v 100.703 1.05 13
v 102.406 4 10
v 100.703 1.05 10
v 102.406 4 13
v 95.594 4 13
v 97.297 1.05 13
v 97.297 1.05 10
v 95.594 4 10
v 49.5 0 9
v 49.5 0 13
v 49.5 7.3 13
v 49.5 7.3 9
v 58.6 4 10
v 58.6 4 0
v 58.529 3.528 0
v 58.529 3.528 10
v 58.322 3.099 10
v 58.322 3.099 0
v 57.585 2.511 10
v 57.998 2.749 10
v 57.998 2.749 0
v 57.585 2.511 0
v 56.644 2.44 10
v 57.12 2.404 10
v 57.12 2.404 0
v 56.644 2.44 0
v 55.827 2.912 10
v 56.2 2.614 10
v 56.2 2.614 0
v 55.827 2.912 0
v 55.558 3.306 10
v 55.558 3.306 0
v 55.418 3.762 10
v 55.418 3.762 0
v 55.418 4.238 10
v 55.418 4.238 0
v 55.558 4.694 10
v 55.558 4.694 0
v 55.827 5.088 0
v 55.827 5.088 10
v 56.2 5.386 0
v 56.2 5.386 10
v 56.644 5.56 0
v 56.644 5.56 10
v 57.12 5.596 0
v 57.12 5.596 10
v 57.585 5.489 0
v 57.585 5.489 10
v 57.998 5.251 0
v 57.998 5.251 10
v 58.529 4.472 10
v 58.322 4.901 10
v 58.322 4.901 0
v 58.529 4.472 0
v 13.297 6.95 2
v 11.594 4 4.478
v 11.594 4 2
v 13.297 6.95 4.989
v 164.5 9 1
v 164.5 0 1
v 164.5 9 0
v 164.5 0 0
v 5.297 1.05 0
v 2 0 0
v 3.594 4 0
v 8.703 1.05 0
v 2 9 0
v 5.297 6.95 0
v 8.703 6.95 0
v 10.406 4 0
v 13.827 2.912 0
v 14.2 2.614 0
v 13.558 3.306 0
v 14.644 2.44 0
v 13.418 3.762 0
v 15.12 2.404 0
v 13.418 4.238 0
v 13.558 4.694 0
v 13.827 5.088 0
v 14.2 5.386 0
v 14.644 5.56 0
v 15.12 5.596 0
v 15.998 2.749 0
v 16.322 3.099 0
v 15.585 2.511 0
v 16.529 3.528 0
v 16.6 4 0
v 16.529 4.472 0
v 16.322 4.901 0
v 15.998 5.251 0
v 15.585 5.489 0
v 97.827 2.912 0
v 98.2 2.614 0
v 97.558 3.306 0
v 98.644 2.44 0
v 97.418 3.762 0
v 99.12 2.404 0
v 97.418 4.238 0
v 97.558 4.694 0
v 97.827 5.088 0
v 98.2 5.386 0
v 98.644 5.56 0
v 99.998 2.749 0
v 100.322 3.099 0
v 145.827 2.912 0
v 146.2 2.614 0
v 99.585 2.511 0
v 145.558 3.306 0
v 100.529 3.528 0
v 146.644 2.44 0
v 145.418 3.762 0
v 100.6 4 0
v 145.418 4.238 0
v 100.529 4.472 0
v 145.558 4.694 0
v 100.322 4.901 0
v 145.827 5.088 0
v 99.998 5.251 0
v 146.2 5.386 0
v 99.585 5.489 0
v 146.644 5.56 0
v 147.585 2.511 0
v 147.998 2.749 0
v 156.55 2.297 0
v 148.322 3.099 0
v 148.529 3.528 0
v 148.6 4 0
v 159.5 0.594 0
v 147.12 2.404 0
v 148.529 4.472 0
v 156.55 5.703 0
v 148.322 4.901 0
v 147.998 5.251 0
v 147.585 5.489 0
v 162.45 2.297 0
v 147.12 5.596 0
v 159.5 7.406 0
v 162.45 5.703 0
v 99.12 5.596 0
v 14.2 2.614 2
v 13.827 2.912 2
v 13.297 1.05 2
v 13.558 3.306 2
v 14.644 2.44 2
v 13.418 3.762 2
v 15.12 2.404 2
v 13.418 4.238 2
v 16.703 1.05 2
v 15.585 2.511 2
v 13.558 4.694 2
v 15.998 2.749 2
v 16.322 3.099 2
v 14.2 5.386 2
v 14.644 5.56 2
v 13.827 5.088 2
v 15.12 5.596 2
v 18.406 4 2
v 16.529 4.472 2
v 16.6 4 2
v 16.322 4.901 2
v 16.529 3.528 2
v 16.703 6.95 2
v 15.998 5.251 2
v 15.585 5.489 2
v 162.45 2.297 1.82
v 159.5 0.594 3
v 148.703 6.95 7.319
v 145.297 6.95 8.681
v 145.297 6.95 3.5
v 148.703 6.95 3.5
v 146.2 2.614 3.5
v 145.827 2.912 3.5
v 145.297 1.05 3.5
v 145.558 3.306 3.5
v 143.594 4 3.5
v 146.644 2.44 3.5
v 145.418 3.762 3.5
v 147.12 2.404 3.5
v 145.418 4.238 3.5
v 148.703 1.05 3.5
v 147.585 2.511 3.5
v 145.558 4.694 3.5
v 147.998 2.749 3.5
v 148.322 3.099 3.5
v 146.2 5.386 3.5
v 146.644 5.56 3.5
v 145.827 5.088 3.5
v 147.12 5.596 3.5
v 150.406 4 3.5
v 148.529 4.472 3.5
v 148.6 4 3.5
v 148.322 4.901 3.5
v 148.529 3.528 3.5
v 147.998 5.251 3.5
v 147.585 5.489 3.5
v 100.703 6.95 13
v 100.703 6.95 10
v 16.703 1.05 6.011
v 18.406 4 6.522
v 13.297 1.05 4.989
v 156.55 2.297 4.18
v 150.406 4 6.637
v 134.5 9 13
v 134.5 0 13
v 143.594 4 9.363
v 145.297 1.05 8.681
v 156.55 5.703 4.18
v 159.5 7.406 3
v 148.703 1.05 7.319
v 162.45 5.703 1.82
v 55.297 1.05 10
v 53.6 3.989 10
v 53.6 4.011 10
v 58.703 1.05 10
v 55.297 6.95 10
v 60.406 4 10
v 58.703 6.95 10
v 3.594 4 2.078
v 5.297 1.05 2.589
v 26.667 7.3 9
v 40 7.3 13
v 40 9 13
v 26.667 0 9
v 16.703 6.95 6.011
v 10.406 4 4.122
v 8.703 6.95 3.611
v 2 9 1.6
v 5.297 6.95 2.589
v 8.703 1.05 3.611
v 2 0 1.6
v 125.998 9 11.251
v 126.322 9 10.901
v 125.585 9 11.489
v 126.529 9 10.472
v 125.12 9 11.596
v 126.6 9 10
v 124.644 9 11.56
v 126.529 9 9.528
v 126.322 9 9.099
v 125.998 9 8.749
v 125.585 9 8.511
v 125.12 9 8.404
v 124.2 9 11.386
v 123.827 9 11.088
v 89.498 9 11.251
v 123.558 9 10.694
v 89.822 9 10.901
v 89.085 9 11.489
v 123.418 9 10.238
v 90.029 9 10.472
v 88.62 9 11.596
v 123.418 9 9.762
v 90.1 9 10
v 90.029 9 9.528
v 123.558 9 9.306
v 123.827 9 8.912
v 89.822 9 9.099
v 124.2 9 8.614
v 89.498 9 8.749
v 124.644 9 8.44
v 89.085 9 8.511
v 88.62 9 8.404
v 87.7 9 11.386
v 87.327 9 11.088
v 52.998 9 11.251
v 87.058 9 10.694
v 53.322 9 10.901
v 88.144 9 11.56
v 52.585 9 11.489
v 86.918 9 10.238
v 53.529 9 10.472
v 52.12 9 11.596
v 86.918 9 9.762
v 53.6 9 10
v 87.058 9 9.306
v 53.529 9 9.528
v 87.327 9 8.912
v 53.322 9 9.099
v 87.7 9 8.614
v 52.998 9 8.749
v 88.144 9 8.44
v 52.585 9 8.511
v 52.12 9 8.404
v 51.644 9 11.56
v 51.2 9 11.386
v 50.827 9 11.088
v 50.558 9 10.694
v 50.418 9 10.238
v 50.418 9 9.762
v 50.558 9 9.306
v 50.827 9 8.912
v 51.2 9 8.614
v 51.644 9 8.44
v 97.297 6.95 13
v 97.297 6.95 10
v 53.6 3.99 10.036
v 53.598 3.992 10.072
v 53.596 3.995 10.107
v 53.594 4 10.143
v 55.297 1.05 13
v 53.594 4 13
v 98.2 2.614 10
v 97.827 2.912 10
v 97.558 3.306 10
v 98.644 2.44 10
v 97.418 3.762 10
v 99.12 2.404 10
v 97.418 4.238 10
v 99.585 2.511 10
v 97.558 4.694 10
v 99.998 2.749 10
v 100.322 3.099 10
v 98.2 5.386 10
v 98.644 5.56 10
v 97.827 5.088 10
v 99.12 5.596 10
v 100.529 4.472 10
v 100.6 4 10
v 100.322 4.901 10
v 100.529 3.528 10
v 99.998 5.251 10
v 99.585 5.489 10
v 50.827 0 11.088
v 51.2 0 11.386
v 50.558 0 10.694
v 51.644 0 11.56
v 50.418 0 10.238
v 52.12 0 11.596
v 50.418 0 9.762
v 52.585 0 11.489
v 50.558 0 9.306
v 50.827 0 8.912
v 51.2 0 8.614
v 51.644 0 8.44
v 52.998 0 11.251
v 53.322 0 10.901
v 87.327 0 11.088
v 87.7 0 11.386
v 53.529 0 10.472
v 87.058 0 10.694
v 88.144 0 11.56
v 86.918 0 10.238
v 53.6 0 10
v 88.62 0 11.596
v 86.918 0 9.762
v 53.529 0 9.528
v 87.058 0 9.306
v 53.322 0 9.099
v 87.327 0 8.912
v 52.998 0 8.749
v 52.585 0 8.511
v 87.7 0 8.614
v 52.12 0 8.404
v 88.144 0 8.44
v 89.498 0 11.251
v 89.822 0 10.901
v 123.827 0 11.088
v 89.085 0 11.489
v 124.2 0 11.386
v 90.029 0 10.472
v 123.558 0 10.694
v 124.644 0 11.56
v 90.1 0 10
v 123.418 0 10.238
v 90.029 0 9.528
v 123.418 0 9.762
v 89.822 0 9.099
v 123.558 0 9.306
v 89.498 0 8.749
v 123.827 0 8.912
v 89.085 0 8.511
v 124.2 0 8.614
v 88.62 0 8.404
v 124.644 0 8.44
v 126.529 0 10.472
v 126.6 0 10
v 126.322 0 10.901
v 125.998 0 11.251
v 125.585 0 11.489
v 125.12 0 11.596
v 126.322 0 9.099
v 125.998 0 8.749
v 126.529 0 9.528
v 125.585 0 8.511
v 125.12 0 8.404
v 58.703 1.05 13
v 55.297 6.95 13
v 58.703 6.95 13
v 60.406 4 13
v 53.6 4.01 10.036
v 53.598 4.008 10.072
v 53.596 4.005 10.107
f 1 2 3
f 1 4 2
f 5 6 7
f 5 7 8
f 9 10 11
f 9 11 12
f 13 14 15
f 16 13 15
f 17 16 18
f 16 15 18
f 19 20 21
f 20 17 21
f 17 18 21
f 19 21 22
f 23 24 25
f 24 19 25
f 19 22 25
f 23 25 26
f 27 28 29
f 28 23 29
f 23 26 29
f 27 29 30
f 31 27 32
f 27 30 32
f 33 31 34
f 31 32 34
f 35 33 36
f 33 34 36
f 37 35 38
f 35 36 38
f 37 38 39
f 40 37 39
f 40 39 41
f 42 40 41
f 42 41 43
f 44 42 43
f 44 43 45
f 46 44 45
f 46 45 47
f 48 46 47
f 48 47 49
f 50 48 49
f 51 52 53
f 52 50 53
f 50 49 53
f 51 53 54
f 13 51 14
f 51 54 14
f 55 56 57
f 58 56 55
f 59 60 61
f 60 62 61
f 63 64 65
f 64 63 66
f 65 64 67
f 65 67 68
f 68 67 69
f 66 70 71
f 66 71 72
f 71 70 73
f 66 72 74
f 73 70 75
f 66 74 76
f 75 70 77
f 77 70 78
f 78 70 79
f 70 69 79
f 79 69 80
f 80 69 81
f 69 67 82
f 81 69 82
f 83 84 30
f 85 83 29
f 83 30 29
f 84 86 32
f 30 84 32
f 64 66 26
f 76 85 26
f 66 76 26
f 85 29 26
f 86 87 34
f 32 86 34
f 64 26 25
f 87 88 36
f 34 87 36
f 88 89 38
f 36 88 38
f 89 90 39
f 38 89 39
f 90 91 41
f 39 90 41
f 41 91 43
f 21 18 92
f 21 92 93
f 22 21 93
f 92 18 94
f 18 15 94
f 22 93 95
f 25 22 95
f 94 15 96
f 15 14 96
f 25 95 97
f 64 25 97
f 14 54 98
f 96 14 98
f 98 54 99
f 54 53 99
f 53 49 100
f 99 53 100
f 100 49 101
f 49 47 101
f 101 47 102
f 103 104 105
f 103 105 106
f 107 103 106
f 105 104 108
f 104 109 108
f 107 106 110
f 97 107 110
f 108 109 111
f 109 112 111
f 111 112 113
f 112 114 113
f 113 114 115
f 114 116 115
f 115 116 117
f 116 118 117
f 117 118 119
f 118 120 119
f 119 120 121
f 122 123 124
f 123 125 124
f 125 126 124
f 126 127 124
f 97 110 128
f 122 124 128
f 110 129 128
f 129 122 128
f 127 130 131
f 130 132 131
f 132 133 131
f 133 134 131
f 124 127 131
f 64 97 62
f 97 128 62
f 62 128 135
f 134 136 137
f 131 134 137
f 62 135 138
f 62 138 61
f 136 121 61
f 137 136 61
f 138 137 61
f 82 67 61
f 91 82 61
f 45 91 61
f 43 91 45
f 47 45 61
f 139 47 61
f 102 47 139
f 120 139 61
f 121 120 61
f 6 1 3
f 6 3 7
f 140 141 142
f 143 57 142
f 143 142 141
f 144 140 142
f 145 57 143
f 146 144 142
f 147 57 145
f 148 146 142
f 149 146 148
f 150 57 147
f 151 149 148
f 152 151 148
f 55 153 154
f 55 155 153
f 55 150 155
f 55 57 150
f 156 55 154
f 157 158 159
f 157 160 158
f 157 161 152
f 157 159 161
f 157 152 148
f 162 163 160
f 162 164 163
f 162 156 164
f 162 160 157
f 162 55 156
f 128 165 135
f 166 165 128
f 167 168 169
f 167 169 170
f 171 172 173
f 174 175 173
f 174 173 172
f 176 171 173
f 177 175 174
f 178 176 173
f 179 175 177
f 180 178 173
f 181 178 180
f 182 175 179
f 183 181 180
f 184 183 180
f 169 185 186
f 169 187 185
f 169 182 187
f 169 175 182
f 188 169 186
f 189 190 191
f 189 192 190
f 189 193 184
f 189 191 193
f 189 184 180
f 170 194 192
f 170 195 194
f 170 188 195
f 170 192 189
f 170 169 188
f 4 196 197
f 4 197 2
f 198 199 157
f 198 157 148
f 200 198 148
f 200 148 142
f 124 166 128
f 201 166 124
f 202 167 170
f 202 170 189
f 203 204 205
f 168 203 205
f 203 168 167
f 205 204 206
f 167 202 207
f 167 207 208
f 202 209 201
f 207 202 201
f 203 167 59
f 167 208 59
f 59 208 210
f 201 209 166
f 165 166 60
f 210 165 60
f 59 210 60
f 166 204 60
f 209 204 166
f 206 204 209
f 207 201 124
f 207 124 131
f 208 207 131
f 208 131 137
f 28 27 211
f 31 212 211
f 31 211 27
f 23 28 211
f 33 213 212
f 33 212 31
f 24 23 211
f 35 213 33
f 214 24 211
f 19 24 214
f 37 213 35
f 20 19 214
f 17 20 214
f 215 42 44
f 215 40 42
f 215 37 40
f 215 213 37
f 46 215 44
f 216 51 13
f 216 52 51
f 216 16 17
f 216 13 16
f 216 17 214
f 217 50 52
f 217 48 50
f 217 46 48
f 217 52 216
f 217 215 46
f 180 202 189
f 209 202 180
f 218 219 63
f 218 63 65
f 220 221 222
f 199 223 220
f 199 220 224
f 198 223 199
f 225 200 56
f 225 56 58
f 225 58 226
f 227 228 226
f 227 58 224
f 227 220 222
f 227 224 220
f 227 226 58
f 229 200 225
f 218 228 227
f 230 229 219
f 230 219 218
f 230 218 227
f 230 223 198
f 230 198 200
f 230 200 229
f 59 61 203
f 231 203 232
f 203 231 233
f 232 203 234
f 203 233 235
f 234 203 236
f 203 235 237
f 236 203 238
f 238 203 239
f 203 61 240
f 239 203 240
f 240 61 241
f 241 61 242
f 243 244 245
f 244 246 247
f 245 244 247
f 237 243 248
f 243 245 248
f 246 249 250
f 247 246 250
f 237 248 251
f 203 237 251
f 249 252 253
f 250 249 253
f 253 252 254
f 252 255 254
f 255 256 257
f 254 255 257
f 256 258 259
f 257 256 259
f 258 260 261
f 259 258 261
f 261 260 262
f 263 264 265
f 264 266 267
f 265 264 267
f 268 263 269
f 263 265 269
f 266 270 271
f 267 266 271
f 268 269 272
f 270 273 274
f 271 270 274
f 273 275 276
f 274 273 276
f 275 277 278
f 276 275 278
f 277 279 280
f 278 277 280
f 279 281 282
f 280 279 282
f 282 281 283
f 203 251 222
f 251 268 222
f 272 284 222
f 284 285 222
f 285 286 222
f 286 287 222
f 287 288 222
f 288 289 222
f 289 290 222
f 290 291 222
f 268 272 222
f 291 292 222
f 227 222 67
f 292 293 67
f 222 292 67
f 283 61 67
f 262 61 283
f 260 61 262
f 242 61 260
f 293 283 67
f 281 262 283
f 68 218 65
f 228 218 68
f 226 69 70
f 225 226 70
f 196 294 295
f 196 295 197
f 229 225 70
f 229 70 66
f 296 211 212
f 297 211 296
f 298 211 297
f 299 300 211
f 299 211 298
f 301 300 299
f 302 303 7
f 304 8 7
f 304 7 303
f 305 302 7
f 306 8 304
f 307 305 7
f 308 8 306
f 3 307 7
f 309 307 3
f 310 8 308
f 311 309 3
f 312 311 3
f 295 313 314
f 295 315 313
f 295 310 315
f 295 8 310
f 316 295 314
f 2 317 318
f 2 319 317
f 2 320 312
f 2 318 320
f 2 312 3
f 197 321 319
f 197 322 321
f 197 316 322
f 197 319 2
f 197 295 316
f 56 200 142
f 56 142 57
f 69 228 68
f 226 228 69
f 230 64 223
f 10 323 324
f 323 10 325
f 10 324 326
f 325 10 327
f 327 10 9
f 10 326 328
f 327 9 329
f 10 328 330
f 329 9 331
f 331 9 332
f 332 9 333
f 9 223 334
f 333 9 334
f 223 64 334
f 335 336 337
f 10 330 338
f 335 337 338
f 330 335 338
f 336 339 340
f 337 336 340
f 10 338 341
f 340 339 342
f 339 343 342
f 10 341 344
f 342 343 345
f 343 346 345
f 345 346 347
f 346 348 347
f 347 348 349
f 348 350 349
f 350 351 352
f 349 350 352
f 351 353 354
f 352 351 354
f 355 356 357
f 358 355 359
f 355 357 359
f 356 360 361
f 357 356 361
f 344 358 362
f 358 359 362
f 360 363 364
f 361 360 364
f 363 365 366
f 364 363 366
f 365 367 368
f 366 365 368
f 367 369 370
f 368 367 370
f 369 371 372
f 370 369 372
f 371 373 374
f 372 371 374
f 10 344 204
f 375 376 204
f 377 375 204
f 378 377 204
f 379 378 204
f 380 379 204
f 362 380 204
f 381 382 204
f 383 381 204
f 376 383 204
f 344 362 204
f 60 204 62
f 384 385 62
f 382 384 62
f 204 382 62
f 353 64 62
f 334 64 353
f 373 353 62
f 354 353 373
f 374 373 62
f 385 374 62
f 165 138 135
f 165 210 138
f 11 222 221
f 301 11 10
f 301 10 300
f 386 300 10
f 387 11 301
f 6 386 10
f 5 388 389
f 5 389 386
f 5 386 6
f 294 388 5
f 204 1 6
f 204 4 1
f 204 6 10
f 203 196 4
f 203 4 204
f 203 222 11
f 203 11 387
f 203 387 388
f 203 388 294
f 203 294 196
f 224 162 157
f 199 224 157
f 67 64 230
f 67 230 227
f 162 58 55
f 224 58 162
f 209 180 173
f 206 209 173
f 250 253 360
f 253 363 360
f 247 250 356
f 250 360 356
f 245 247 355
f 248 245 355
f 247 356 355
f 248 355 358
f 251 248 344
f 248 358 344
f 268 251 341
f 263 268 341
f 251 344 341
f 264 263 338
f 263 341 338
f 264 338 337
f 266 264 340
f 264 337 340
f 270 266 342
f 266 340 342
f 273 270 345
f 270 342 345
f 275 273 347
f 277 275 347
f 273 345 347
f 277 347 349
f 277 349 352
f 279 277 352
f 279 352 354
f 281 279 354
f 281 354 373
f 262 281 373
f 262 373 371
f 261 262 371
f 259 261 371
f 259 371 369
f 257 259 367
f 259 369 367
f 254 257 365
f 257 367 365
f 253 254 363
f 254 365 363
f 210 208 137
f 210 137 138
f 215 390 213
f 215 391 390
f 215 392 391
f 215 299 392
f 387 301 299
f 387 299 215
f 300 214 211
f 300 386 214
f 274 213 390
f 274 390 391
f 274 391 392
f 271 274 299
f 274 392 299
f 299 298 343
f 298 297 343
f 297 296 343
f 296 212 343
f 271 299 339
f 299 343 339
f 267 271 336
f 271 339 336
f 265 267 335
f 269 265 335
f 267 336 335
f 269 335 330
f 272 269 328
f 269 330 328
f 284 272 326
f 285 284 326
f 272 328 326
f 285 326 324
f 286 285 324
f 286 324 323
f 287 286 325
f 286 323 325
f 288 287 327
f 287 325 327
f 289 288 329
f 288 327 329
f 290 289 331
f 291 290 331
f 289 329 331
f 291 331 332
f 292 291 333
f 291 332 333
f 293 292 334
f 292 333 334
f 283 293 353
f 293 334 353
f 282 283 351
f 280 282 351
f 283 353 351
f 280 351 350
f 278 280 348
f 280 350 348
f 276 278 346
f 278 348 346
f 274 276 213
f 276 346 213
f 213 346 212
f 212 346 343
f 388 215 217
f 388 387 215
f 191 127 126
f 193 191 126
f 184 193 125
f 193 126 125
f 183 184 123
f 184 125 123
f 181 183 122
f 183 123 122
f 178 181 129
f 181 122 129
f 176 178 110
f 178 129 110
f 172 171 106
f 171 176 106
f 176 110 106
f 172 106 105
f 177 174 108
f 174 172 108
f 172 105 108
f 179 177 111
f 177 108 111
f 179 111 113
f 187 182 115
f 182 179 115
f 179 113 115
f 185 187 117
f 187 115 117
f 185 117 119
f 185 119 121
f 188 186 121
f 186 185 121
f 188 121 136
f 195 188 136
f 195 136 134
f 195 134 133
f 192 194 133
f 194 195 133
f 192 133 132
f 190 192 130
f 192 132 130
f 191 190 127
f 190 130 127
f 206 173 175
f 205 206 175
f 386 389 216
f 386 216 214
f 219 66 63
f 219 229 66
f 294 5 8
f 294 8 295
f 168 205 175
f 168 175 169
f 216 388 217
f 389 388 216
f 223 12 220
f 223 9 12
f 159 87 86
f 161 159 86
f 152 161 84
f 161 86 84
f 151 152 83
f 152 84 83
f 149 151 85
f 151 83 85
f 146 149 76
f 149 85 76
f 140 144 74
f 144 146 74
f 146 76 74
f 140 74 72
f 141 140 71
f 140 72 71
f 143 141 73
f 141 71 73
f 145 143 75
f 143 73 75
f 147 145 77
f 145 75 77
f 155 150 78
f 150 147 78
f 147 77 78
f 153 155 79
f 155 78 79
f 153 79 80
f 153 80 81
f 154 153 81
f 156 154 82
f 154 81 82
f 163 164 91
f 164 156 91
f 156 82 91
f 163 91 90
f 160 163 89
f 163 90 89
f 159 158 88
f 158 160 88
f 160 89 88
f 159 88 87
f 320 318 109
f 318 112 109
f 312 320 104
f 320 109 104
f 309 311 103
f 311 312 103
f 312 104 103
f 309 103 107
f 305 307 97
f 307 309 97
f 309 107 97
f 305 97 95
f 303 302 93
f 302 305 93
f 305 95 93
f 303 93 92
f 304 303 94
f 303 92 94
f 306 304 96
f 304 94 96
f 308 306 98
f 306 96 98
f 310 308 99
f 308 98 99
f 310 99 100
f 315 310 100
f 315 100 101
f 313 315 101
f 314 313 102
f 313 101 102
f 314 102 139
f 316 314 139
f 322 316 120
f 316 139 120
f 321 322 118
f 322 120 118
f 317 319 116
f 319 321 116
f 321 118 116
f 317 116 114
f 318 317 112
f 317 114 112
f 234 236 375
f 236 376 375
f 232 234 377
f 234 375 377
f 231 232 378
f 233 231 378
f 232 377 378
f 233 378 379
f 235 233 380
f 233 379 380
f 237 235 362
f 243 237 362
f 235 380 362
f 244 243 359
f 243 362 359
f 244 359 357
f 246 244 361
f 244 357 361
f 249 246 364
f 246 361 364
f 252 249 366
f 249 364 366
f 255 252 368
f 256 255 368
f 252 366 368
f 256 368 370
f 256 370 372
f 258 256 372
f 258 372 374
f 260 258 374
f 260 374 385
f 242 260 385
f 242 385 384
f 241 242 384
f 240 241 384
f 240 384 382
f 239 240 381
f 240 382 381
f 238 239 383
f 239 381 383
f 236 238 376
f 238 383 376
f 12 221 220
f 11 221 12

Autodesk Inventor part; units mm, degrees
ref_plane "YZ Plane" through (0, 0, 0) normal (1, 0, 0) x (0, 1, 0)
ref_plane "XZ Plane" through (0, 0, 0) normal (0, 1, 0) x (-1, 0, 0)
ref_plane "XY Plane" through (0, 0, 0) normal (0, 0, 1) x (1, 0, 0)
sketch "Sketch1" plane through (0, 0, 0) normal (0, 0, 1) x (1, 0, 0)
  line L0 (0, 0) -> (164.5, 0)
  line L1 (164.5, 0) -> (164.5, 9)
  line L2 (164.5, 9) -> (0, 9)
  line L3 (0, 9) -> (0, 0)
  circle A0 centre (57, 4) radius 1.6
  circle A1 centre (99, 4) radius 1.6
  circle A2 centre (159.5, 4) radius 1.6
  circle A3 centre (147, 4) radius 1.6
  circle A4 centre (15, 4) radius 1.6
  circle A5 centre (7, 4) radius 1.6
  dimension "d1" = 9
  dimension "d2" = 90
  dimension "d4" = 3.2
  dimension "d6" = 3.2
  dimension "d7" = 3.2
  dimension "d8" = 42
  dimension "d9" = 60.5
  dimension "d26" = 3.2
  dimension "d27" = 48
  dimension "d28" = 3.2
  dimension "d29" = 42
  dimension "d32" = 15
  dimension "d33" = 5
  dimension "d61" = 3.2
  dimension "d62" = 8
  dimension "d63" = 12.5
  dimension "d108" = 4
  dimension "d109" = 4
  dimension "d110" = 4
  dimension "d111" = 4
  dimension "d112" = 4
  dimension "d113" = 4
ref_plane "Work Plane2" through (0, 0, 0) normal (0, -1, 0) x (1, 0, 0)
sketch "Sketch2" plane through (0, 0, 0) normal (0, -1, 0) x (1, 0, 0)
  circle A0 centre (52, 10) radius 1.6
  circle A1 centre (125, 10) radius 1.6
  circle A2 centre (88.5, 10) radius 1.6
  point P0 (0, 0)
  point P1 (52, 0)
  dimension "d13" = 3.2
  dimension "d15" = 3.2
  dimension "d17" = 3.2
  dimension "d18" = 36.5
  dimension "d64" = 52
  dimension "d65" = 36.5
  dimension "d114" = 10
  dimension "d115" = 73
ref_plane "Work Plane1" through (0, 0, 11) normal (0, 0, 1) x (1, 0, 0)
extrude "klocek" add sketch "Sketch1" along normal blind 13
ref_plane "Work Plane3" through (0, 0, 0) normal (0, -1, 0) x (1, 0, 0)
extrude "prowadzenie osi" cut sketch "Sketch2" against normal up to next
ref_plane "Work Plane4" through (0, 0, 0) normal (0, -1, 0) x (1, 0, 0)
sketch "Sketch7" plane through (0, 0, 0) normal (0, -1, 0) x (1, 0, 0)
  line L0 (0, 13) -> (0, 1)
  line L1 (0, 13) -> (164.5, 13) projected
  line L2 (0, 13) -> (40, 13)
  line L3 (40, 13) -> (0, 1)
  point P0 (0, -1.8333)
  dimension "d86" = 12
  dimension "d87" = 40
sketch "Sketch8" plane through (0, 0, 0) normal (0, -1, 0) x (1, 0, 0)
  line L0 (164.5, 0) -> (164.5, 13) projected
  line L1 (164.5, 13) -> (164.5, 1)
  line L2 (164.5, 13) -> (0, 13) projected
  line L3 (164.5, 13) -> (134.5, 13)
  line L4 (134.5, 13) -> (164.5, 1)
  point P0 (0, 0)
  point P1 (40.8333, 11)
  dimension "d80" = 12
  dimension "d81" = 30
extrude "przedni skos" cut sketch "Sketch7" against normal up to next
extrude "tylni skos" cut sketch "Sketch8" against normal up to next
ref_plane "Work Plane7" through (0, 0, 11) normal (0, 0, 1) x (1, 0, 0)
sketch "Sketch5" plane through (0, 0, 13) normal (0, 0, 1) x (1, 0, 0)
  circle A0 centre (99, 4) radius 1.6 projected
  line L0 (95.5936, 4) -> (97.2968, 6.95)
  line L1 (97.2968, 6.95) -> (100.7032, 6.95)
  line L2 (100.7032, 6.95) -> (102.4064, 4)
  line L3 (102.4064, 4) -> (100.7032, 1.05)
  line L4 (100.7032, 1.05) -> (97.2968, 1.05)
  line L5 (97.2968, 1.05) -> (95.5936, 4)
  circle A1 centre (57, 4) radius 1.6 projected
  line L6 (60.4064, 4) -> (58.7032, 1.05)
  line L7 (58.7032, 1.05) -> (55.2968, 1.05)
  line L8 (55.2968, 1.05) -> (53.5936, 4)
  line L9 (53.5936, 4) -> (55.2968, 6.95)
  line L10 (55.2968, 6.95) -> (58.7032, 6.95)
  line L11 (58.7032, 6.95) -> (60.4064, 4)
  point P0 (119.5, 5)
  dimension "d98" = 5.9
  dimension "d100" = 5.9
extrude "hex insert middle" cut sketch "Sketch5" against normal blind 3
ref_plane "Work Plane6" through (0, 0, 11) normal (0, 0, 1) x (1, 0, 0)
sketch "Sketch9" plane through (0, 0, 11) normal (0, 0, 1) x (1, 0, 0)
  circle A0 centre (147, 4) radius 1.6 projected
  line L0 (150.4064, 4) -> (148.7032, 1.05)
  line L1 (148.7032, 1.05) -> (145.2968, 1.05)
  line L2 (145.2968, 1.05) -> (143.5936, 4)
  line L3 (143.5936, 4) -> (145.2968, 6.95)
  line L4 (145.2968, 6.95) -> (148.7032, 6.95)
  line L5 (148.7032, 6.95) -> (150.4064, 4)
  point P0 (0, 0)
  point P1 (153, 5)
  dimension "d99" = 5.9
extrude "hex insert rear 1" cut sketch "Sketch9" against normal blind 7.5
ref_plane "Work Plane5" through (0, 0, 11) normal (0, 0, 1) x (1, 0, 0)
sketch "Sketch10" plane through (0, 0, 11) normal (0, 0, 1) x (1, 0, 0)
  circle A0 centre (159.5, 4) radius 1.6 projected
  line L0 (162.45, 5.7032) -> (162.45, 2.2968)
  line L1 (162.45, 2.2968) -> (159.5, 0.5936)
  line L2 (159.5, 0.5936) -> (156.55, 2.2968)
  line L3 (156.55, 2.2968) -> (156.55, 5.7032)
  line L4 (156.55, 5.7032) -> (159.5, 7.4064)
  line L5 (159.5, 7.4064) -> (162.45, 5.7032)
  line L6 (164.5, 0) -> (134.5, 0) projected
  point P0 (0, 0)
  dimension "d118" = 5.9
extrude "hex insert rear 2" cut sketch "Sketch10" against normal up to next contours A0 | L0 L1 L2 L3 L4 L5
sketch "Sketch13" plane through (0, 0, 11) normal (0, 0, 1) x (1, 0, 0)
  circle A0 centre (7, 4) radius 1.6 projected
  line L0 (10.4064, 4) -> (8.7032, 1.05)
  line L1 (8.7032, 1.05) -> (5.2968, 1.05)
  line L2 (5.2968, 1.05) -> (3.5936, 4)
  line L3 (3.5936, 4) -> (5.2968, 6.95)
  line L4 (5.2968, 6.95) -> (8.7032, 6.95)
  line L5 (8.7032, 6.95) -> (10.4064, 4)
  dimension "d123" = 5.9
extrude "hex insert front 1" cut sketch "Sketch13" against normal through all
sketch "Sketch16" plane through (0, 0, 11) normal (0, 0, 1) x (1, 0, 0)
  circle A0 centre (15, 4) radius 1.6 projected
  line L0 (18.4064, 4) -> (16.7032, 1.05)
  line L1 (16.7032, 1.05) -> (13.2968, 1.05)
  line L2 (13.2968, 1.05) -> (11.5936, 4)
  line L3 (11.5936, 4) -> (13.2968, 6.95)
  line L4 (13.2968, 6.95) -> (16.7032, 6.95)
  line L5 (16.7032, 6.95) -> (18.4064, 4)
  point P0 (0, 0)
  dimension "d93" = 5.9
extrude "hex insert front 2" cut sketch "Sketch16" against normal blind 9
sketch "Sketch17" plane through (0, 0, 0) normal (0, 0, -1) x (-1, 0, 0)
  line L0 (-164.5, 9) -> (0, 9) projected
  line L1 (0, 0) -> (-2, 0)
  line L2 (-2, 0) -> (-2, 9)
  line L3 (-2, 9) -> (0, 9)
  line L4 (0, 9) -> (0, 0)
  dimension "d122" = 2
extrude "ciecie przod" cut sketch "Sketch17" against normal up to next
sketch "Sketch18" plane through (40, 0, 13) normal (0, -1, 0) x (1, 0, 0)
  line L0 (9.5, 0) -> (9.5, -4)
  line L1 (9.5, -4) -> (-15.5, -4)
  line L2 (-15.5, -4) -> (-15.5, 0)
  line L3 (-15.5, 0) -> (9.5, 0)
  line L4 (94.5, 0) -> (0, 0) projected
  circle A0 centre (12, -3) radius 1.6 projected
  line L5 (-40, -13) -> (124.5, -13) projected
  point P0 (-35, -11)
  dimension "d102" = 4
  dimension "d103" = 25
  dimension "d104" = 2.5
extrude "sensor linii" cut sketch "Sketch18" against normal blind 7.3 contours L0 L1 L2 L3
properties part number "wheel_support_v5_narrow_with_line_sensor_all_holes_2mm_higher"
